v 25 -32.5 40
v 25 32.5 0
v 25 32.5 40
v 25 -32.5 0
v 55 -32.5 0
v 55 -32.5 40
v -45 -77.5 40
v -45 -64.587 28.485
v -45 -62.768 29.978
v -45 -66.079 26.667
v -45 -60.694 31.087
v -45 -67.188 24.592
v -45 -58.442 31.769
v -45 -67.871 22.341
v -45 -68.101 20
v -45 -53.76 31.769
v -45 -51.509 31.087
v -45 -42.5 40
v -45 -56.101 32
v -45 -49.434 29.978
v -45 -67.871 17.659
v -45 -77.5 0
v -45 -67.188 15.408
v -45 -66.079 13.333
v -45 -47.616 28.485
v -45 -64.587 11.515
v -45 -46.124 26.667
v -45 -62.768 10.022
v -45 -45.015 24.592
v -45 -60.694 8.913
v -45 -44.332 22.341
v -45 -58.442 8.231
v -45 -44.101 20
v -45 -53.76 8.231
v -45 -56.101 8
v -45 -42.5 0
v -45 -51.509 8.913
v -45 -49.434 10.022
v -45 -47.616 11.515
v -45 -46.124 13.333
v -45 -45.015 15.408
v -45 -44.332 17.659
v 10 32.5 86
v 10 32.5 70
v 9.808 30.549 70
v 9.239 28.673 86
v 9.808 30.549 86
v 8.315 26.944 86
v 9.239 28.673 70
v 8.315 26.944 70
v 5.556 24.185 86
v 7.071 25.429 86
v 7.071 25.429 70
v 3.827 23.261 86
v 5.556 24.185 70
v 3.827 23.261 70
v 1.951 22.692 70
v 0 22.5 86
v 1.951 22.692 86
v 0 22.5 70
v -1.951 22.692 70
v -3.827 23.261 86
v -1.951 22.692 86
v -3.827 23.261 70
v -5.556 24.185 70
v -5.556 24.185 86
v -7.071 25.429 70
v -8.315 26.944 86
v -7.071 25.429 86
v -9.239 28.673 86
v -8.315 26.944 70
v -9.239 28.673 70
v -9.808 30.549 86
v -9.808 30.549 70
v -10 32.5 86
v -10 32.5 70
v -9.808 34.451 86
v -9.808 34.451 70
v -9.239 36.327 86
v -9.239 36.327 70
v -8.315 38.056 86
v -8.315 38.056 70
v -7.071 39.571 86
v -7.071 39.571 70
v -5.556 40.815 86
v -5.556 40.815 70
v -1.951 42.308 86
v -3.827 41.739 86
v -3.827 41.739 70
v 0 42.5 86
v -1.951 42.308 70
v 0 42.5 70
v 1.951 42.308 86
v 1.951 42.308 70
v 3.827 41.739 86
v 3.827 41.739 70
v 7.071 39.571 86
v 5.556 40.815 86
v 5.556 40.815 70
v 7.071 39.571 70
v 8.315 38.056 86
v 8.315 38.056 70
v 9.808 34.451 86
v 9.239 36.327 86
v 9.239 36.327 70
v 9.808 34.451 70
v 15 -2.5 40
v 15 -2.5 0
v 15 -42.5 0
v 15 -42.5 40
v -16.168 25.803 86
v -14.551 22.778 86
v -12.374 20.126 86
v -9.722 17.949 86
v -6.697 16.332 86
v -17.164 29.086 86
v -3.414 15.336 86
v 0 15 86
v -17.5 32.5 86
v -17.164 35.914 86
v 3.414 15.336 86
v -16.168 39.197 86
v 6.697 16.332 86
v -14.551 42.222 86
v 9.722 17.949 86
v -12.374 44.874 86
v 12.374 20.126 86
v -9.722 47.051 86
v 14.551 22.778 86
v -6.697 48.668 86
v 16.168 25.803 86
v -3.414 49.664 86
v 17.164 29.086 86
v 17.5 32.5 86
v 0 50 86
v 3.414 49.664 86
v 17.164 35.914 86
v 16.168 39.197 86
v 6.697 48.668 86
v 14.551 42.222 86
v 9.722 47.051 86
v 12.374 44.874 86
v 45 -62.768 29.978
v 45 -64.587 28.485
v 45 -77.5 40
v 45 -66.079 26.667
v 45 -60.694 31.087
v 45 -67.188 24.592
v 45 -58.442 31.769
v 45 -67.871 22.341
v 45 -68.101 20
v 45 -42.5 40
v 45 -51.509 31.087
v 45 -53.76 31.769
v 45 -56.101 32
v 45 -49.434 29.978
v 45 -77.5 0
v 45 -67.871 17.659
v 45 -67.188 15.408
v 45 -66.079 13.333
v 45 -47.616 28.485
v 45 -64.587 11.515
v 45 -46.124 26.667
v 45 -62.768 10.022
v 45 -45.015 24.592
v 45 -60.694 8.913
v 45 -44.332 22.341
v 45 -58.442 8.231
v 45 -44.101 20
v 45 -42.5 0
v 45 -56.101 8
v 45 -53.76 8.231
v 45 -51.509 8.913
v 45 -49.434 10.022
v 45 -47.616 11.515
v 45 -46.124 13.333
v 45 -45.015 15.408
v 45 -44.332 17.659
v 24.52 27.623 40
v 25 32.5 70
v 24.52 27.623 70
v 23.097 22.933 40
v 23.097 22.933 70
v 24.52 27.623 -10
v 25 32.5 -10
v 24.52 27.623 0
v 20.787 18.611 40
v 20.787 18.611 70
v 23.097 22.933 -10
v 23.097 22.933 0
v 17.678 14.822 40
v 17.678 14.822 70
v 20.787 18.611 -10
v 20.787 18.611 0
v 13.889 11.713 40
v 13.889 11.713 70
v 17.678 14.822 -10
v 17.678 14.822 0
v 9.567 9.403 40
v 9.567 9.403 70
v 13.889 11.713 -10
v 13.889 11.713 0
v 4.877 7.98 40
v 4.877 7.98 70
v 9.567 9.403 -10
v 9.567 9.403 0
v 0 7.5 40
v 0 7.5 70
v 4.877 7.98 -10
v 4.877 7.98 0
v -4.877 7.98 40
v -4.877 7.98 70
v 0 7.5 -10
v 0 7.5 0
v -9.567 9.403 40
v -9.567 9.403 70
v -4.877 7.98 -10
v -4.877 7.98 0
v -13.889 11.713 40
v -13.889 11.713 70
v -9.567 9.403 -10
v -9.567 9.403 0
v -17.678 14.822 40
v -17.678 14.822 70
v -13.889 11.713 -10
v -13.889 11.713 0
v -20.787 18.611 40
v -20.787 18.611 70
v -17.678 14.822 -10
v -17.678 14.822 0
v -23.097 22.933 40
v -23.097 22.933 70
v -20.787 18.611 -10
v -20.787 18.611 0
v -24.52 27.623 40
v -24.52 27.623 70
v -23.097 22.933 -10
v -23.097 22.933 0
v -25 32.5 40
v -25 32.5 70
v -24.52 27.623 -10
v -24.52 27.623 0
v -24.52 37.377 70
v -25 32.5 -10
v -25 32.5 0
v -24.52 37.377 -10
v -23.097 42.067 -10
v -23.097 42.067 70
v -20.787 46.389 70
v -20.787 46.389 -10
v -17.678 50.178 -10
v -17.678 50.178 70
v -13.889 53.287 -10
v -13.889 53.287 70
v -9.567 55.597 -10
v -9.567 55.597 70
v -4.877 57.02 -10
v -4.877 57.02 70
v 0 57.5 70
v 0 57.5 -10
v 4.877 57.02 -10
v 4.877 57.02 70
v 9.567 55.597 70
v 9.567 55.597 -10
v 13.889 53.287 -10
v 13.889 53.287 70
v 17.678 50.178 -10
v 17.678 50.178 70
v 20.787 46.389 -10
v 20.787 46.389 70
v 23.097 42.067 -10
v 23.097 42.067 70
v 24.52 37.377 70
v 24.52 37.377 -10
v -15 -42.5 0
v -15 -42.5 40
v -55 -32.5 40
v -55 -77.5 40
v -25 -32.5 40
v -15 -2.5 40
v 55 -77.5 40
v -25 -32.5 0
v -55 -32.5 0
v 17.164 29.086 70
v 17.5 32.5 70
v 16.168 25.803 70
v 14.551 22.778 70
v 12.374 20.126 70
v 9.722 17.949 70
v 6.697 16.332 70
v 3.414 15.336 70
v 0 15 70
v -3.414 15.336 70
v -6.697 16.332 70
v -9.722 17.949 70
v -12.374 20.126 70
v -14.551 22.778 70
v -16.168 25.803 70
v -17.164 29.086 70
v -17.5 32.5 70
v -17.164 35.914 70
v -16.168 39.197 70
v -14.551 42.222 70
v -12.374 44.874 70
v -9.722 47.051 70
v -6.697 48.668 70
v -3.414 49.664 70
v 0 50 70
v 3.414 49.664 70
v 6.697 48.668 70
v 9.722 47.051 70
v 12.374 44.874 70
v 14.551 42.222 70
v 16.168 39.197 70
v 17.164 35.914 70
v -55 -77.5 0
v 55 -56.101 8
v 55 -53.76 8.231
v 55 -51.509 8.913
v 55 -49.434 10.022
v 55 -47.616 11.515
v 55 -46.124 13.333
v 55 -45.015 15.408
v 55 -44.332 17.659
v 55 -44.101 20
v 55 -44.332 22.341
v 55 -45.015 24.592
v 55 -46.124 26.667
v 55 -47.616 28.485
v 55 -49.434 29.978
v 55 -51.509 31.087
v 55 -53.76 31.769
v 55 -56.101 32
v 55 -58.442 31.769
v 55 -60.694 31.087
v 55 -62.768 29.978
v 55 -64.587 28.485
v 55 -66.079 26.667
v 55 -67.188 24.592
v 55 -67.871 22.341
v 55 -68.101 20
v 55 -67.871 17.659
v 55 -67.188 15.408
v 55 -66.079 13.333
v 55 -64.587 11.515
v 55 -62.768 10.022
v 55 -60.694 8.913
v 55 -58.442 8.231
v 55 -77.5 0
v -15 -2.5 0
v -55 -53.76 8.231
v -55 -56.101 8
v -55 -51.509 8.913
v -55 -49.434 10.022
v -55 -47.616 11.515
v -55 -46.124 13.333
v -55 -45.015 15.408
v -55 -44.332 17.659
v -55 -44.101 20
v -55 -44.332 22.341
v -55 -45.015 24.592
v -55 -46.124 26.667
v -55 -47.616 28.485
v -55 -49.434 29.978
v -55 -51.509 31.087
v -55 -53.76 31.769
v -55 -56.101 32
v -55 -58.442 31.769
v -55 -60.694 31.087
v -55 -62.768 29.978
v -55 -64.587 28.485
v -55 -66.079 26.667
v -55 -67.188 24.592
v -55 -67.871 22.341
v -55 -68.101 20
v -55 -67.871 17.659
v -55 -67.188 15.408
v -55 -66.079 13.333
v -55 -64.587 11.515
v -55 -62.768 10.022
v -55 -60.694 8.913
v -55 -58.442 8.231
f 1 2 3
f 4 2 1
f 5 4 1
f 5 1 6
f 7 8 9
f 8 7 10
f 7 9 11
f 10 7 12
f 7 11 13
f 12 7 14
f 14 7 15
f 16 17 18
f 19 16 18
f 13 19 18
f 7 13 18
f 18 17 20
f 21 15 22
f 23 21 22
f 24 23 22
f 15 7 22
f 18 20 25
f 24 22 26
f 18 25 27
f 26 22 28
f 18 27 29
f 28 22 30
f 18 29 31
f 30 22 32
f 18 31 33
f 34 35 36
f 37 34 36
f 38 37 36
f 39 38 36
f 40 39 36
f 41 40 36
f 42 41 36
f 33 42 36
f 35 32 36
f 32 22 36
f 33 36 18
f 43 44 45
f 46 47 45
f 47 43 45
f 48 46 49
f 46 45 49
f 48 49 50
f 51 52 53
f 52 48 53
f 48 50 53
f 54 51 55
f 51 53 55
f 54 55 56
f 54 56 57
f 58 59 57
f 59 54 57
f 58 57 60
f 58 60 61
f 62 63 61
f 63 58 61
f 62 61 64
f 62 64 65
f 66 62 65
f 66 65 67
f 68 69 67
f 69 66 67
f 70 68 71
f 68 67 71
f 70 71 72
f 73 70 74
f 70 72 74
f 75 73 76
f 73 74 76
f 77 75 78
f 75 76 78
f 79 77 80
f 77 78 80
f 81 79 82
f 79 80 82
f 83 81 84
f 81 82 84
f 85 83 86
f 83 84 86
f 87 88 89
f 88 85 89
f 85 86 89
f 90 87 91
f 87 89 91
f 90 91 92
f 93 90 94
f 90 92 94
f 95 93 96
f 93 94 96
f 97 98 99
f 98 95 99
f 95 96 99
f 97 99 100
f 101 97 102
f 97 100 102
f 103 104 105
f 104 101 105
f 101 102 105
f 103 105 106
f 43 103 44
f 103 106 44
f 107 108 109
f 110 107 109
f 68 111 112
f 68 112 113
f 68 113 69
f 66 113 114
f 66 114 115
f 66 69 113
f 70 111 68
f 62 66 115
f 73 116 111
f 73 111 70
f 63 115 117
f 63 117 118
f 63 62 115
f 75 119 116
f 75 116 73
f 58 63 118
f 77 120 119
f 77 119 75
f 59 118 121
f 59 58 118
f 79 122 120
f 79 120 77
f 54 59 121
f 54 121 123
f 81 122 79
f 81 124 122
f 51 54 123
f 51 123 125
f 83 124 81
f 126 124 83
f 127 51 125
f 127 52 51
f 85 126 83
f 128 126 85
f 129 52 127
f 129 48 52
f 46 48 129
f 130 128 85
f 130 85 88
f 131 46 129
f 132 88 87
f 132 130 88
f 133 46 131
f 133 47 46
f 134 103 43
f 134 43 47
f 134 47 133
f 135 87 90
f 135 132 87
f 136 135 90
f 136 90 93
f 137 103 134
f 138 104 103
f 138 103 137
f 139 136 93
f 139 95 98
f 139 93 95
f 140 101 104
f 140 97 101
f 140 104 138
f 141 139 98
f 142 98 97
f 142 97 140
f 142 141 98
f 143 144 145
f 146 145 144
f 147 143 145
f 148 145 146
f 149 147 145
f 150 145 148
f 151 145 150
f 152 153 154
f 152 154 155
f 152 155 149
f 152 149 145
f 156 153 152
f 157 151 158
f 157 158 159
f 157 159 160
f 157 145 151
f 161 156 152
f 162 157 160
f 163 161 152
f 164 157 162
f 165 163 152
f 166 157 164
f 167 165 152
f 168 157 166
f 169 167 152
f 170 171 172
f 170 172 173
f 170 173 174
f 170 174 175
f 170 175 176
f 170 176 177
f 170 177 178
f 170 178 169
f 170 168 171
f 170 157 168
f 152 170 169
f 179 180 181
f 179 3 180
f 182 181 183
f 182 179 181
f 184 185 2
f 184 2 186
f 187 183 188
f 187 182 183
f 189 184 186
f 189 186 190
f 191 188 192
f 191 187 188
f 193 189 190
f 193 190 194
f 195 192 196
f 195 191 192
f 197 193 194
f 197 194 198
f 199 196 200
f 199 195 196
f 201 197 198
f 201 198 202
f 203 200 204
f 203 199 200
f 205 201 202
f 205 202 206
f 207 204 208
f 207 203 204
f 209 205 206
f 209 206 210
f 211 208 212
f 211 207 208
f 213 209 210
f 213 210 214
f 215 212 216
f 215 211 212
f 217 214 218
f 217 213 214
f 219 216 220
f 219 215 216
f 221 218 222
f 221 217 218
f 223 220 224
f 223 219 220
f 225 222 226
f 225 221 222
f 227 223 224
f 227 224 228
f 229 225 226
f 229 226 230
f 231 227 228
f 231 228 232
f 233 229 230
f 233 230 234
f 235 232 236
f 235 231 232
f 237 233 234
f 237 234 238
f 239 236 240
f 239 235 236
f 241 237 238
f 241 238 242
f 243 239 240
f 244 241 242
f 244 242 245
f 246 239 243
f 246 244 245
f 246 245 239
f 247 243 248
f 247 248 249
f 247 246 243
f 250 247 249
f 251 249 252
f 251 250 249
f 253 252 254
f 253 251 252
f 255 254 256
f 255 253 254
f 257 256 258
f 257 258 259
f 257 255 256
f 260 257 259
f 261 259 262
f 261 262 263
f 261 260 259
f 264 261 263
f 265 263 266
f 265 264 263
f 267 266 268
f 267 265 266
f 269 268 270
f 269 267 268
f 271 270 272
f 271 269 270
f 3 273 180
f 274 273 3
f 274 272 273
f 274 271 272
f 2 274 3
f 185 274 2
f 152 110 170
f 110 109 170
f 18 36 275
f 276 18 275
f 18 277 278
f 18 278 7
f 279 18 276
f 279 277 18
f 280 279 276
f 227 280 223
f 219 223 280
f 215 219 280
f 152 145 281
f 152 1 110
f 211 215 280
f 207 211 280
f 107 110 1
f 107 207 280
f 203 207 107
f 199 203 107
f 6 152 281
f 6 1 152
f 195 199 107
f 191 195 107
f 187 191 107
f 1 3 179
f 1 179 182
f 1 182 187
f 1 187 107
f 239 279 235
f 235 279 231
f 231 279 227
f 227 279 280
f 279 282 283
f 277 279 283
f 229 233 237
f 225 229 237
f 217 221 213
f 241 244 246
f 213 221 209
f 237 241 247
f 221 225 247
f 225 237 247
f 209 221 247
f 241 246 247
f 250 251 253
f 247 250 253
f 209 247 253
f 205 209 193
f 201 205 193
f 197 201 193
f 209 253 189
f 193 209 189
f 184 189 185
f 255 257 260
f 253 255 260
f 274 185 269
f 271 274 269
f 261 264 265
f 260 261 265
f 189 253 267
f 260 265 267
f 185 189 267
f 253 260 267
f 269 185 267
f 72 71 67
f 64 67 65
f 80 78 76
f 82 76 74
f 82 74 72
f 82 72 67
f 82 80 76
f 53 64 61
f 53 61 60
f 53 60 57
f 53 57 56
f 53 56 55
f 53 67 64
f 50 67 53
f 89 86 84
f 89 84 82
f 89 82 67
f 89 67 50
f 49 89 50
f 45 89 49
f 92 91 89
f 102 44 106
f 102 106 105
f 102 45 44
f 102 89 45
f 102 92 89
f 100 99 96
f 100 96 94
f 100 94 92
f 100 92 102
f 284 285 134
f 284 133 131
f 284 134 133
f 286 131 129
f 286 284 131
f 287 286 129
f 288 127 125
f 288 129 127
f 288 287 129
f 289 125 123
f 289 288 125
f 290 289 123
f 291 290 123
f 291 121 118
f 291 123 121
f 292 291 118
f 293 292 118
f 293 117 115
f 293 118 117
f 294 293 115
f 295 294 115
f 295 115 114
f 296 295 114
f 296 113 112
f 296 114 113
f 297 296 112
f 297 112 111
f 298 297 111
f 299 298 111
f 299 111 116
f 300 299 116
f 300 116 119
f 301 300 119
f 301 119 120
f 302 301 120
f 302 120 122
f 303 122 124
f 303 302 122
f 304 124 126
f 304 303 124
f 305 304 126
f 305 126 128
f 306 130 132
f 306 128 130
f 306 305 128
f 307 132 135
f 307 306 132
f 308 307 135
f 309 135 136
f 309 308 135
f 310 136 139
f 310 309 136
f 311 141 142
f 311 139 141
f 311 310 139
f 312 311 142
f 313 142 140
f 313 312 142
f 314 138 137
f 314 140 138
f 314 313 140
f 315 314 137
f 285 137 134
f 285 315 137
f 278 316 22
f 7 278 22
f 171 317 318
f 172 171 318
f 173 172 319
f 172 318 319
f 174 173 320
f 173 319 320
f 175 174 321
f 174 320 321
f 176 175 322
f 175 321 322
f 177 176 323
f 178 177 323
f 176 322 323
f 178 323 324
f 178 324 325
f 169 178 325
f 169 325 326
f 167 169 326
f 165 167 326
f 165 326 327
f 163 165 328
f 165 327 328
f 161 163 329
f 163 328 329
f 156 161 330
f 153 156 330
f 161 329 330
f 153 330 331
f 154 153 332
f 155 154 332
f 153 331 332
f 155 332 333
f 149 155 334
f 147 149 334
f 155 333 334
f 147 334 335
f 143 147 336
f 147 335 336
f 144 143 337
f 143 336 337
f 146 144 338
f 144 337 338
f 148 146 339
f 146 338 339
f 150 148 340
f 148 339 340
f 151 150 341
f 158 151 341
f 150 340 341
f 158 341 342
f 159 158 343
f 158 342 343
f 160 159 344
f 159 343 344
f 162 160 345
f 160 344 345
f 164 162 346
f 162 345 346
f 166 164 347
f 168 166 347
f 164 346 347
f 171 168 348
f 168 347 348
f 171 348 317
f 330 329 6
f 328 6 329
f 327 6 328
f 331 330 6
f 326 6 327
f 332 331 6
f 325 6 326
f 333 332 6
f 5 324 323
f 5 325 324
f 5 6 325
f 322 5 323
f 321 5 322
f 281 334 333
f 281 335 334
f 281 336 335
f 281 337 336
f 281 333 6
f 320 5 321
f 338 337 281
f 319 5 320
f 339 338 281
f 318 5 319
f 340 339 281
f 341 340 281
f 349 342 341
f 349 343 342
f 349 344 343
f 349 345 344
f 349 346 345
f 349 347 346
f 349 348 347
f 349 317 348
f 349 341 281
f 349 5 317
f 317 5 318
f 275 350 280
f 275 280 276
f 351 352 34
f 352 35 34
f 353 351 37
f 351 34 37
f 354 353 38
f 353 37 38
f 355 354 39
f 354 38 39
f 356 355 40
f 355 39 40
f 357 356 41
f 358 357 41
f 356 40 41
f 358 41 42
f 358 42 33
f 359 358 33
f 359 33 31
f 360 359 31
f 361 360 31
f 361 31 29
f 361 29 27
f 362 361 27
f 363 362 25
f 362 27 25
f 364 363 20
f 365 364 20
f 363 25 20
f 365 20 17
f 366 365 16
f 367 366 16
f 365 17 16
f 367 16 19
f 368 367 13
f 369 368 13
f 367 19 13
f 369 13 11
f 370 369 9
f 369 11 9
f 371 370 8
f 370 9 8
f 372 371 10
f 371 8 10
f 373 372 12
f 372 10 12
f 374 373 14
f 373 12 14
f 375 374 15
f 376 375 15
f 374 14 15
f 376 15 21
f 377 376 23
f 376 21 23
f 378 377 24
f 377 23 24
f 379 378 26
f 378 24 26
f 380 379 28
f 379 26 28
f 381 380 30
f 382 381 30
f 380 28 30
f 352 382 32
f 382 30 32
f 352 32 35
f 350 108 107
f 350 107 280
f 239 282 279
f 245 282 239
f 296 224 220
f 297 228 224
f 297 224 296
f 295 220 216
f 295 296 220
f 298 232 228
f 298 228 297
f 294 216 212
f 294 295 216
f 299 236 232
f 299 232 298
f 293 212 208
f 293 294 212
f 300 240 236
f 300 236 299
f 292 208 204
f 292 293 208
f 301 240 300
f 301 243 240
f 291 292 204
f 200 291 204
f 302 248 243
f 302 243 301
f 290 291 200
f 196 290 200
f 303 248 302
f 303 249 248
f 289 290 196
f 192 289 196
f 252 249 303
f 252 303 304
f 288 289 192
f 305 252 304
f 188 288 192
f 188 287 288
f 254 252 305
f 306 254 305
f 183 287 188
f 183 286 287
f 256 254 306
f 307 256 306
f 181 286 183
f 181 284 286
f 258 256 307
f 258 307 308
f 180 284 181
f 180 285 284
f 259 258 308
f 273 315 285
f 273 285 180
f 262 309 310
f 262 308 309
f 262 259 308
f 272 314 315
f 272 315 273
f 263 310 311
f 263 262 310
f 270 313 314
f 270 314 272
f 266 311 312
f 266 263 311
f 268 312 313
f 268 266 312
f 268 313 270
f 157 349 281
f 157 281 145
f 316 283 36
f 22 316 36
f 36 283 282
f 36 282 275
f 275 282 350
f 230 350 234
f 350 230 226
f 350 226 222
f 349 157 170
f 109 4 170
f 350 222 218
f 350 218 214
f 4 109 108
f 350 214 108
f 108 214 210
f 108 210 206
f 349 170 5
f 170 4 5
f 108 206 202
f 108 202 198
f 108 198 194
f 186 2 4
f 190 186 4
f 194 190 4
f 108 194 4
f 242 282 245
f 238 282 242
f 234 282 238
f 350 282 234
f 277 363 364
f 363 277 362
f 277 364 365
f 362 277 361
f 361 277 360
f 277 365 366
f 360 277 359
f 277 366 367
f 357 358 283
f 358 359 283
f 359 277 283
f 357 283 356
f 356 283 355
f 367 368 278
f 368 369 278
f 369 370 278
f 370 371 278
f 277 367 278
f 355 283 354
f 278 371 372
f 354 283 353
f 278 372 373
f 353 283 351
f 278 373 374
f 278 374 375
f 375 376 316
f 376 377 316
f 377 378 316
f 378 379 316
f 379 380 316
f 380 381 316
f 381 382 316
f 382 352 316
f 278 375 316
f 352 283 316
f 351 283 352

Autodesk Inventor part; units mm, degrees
ref_plane "YZ Plane" through (0, 0, 0) normal (1, 0, 0) x (0, 1, 0)
ref_plane "XZ Plane" through (0, 0, 0) normal (0, 1, 0) x (-1, 0, 0)
ref_plane "XY Plane" through (0, 0, 0) normal (0, 0, 1) x (1, 0, 0)
sketch "Sketch1" plane through (0, 0, 0) normal (0, 0, 1) x (1, 0, 0)
  line L0 (-346.0753, 70.9014) -> (-181.3844, 70.9014) construction
  line L1 (-181.3844, 70.9014) -> (-181.3844, -72.4094) construction
  line L2 (-181.3844, -72.4094) -> (-346.0753, -72.4094) construction
  line L3 (-346.0753, -72.4094) -> (-346.0753, 70.9014) construction
  line L4 (25, 32.5) -> (25, -32.5)
  line L5 (-25, -32.5) -> (-25, 32.5)
  line L6 (-25, 32.5) -> (25, -32.5) construction
  line L7 (25, 32.5) -> (-25, -32.5) construction
  line L8 (15, -2.5) -> (-15, -2.5)
  arc A0 (-25, 32.5) -> (25, 32.5) centre (0, 32.5) ccw
  line L9 (-25, -32.5) -> (-55, -32.5)
  line L10 (-55, -32.5) -> (-55, -77.5)
  line L11 (-55, -77.5) -> (-45, -77.5)
  line L12 (-45, -77.5) -> (-45, -42.5)
  line L13 (25, -32.5) -> (55, -32.5)
  line L14 (55, -32.5) -> (55, -77.5)
  line L15 (55, -77.5) -> (45, -77.5)
  line L16 (45, -77.5) -> (45, -42.5)
  line L17 (-15, -2.5) -> (-15, -42.5)
  line L18 (15, -2.5) -> (15, -42.5)
  line L19 (-45, -42.5) -> (-15, -42.5)
  line L20 (15, -42.5) -> (45, -42.5)
  point P0 (0, 0)
  dimension "d3" = 50
  dimension "d4" = 65
  dimension "d15" = 25
  dimension "d16" = 90
  dimension "d18" = 30
  dimension "d19" = 45
extrude "Extrusion1" add sketch "Sketch1" along normal blind 40
sketch "Sketch2" plane through (0, 0, 40) normal (0, 0, 1) x (1, 0, 0)
  arc A0 (-25, 32.5) -> (25, 32.5) centre (0, 32.5) ccw projected
  circle A1 centre (0, 32.5) radius 25
  point P0 (0, 0)
  point P1 (25, 32.5)
  dimension "d26" = 50
extrude "Extrusion2" add sketch "Sketch2" along normal blind 30 and the other way blind 50
sketch "Sketch3" plane through (0, 32.5, 70) normal (0, 0, 1) x (1, 0, 0)
  arc A0 (-25, 0) -> (25, 0) centre (0, 0) ccw projected
  circle A1 centre (0, 0) radius 17.5
  circle A2 centre (0, 0) radius 10
  point P0 (0, -32.5)
  dimension "d31" = 35
  dimension "d32" = 20
extrude "Extrusion3" add sketch "Sketch3" along normal blind 16
sketch "Sketch4" plane through (45, -77.5, 0) normal (0, -1, 0) x (1, 0, 0)
  point P0 (-45, 0)
sketch "Sketch5" plane through (55, -77.5, 0) normal (1, 0, 0) x (0, 0, -1)
  circle A0 centre (-20, 21.3987) radius 12
  line L0 (0, 0) -> (0, 45) projected
  point P0 (0, 77.5)
  dimension "d35" = 24
  dimension "d36" = 20
extrude "Extrusion4" cut sketch "Sketch5" against normal blind 120
properties part number "cad@54"
